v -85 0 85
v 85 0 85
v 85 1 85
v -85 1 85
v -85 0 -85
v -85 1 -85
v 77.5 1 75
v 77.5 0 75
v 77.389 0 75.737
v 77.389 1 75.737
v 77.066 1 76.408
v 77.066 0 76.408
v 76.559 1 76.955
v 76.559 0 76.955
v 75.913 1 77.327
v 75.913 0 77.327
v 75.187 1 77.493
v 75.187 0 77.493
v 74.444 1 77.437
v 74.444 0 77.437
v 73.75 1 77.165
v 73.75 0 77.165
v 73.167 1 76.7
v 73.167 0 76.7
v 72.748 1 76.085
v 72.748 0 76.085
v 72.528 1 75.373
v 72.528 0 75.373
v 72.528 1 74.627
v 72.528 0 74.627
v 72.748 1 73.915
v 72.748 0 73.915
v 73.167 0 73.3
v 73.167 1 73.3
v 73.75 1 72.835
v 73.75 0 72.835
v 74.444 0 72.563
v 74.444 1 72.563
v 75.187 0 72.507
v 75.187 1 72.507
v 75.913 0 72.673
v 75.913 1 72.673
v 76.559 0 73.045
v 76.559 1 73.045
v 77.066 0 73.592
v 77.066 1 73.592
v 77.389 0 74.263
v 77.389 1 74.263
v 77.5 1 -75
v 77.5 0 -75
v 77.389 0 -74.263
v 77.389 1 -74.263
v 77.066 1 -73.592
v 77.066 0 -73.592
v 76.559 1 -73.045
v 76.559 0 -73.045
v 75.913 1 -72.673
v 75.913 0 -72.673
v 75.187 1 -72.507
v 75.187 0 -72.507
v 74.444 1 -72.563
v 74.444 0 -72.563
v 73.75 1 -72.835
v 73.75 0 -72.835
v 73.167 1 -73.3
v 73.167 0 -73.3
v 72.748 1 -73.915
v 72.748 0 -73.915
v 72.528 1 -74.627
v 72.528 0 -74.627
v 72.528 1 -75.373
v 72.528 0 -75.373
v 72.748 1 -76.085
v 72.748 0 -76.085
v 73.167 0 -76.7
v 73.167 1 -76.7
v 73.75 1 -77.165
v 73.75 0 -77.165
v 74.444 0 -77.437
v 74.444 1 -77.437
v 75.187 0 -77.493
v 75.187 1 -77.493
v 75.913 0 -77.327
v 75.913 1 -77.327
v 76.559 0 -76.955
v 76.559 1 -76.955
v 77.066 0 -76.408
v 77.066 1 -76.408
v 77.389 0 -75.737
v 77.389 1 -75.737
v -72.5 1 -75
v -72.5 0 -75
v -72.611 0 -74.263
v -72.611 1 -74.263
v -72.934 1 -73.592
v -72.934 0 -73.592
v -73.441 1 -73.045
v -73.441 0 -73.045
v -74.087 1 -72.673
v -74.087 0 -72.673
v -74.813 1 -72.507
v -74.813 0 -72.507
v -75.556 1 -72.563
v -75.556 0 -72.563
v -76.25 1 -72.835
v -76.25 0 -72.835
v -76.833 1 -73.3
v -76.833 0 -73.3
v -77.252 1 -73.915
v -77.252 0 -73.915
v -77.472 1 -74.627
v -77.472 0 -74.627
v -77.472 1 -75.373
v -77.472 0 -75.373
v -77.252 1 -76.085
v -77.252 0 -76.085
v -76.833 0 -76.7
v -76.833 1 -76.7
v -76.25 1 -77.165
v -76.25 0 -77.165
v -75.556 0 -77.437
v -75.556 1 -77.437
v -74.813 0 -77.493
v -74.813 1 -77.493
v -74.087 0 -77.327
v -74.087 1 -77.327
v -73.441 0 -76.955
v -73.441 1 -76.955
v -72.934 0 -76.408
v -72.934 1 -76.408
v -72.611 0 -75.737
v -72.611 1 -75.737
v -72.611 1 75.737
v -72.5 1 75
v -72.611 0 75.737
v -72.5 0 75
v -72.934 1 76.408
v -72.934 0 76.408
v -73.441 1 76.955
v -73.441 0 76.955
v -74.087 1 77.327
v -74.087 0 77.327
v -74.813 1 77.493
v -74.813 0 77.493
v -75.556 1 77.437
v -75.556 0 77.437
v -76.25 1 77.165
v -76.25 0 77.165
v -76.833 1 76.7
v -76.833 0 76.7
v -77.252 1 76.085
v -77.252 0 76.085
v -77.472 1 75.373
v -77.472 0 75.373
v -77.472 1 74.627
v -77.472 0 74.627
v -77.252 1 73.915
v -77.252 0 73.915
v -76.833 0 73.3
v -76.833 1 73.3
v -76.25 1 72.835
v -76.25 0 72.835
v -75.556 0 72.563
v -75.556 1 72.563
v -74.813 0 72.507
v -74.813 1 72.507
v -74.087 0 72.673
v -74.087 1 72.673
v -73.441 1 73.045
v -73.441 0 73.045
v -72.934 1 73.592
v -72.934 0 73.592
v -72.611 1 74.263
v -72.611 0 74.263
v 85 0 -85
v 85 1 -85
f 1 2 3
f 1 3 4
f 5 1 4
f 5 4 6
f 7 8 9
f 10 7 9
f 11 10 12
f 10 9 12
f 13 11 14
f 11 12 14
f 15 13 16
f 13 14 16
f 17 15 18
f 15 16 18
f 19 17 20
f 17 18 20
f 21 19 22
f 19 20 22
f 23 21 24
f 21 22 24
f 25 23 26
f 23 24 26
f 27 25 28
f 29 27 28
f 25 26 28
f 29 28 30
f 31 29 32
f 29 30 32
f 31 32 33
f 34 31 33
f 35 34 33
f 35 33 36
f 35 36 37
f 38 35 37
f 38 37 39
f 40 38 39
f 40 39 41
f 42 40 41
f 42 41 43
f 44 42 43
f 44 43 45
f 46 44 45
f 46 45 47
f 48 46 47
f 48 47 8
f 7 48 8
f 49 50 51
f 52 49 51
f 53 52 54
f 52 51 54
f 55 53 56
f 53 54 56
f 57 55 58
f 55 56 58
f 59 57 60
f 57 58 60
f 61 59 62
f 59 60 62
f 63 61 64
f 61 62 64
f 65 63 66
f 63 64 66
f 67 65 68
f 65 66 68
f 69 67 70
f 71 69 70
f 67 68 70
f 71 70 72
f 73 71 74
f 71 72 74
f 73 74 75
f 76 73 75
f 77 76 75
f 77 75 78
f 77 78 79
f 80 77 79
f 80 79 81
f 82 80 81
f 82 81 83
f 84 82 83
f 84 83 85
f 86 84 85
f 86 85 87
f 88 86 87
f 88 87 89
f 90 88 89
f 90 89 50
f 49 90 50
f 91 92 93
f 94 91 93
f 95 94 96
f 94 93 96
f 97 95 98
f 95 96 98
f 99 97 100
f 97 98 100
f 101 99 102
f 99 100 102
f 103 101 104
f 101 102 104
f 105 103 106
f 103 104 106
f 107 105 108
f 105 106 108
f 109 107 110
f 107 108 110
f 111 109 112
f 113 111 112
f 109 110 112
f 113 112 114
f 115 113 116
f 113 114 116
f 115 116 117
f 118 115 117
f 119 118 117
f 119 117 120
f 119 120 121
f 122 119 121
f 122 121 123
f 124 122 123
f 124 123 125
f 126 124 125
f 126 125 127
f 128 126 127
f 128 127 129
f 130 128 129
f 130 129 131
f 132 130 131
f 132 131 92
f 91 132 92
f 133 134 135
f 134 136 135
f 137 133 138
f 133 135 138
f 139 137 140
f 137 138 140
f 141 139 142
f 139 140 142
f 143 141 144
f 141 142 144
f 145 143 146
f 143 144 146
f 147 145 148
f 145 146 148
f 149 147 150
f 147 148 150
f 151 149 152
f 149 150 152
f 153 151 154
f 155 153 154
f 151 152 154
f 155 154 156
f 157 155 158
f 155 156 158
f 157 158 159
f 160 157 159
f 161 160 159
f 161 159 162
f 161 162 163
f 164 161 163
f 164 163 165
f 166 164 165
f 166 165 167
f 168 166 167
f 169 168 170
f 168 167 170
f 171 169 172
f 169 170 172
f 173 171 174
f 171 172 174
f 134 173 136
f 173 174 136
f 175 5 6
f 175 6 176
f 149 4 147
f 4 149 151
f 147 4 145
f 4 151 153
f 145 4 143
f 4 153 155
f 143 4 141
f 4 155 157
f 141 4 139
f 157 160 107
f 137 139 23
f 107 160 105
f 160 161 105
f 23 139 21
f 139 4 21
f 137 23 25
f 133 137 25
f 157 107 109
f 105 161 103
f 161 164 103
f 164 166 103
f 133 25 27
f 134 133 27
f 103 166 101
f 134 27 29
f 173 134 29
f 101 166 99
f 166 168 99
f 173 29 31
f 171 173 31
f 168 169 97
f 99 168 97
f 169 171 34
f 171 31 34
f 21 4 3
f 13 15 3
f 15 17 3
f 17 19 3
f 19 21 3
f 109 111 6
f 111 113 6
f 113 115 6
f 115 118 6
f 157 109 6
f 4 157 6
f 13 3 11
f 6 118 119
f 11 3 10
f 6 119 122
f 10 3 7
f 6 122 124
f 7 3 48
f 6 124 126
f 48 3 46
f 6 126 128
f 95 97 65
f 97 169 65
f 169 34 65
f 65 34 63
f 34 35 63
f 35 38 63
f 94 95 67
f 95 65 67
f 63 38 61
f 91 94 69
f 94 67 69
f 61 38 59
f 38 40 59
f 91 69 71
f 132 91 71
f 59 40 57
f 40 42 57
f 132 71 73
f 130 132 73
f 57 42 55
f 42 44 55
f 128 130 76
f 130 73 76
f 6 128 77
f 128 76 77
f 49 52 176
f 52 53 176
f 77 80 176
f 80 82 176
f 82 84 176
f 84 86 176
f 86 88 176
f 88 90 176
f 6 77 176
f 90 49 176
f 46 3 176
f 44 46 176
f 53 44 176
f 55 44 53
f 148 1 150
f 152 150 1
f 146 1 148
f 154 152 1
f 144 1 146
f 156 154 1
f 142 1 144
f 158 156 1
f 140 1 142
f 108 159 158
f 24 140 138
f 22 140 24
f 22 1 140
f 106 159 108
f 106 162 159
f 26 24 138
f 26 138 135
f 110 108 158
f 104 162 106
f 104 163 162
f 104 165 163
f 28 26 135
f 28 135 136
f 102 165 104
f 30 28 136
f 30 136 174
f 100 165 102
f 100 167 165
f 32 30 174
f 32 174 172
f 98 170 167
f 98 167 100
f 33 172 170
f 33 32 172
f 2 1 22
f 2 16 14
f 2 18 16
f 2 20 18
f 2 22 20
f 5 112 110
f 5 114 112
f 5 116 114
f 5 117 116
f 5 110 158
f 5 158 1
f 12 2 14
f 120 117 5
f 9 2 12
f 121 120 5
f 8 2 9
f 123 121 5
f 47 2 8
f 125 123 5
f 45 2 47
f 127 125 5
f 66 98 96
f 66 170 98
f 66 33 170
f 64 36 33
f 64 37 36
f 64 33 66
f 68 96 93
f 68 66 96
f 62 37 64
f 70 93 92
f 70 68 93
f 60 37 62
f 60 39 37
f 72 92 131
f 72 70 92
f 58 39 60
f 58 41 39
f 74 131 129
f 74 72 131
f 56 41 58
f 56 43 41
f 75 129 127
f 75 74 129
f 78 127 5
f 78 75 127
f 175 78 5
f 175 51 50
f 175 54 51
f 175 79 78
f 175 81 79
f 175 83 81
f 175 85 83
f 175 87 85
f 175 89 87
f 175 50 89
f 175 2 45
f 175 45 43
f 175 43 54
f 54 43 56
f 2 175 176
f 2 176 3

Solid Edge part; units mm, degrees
sketch "Sketch1" plane through (0, 0, 0) normal (0, -1, 0) x (1, 0, 0)
  line L0 (85, 85) -> (-85, 85)
  line L1 (-85, 85) -> (-85, -85)
  line L2 (-85, -85) -> (85, -85)
  line L3 (85, -85) -> (85, 85)
extrude "Protrusion1" add sketch "Sketch1" against normal blind 1
sketch "Sketch2" plane through (0, 0, 0) normal (0, -1, 0) x (1, 0, 0)
  circle A0 centre (-75, 75) radius 2.5
  circle A1 centre (75, 75) radius 2.5
  circle A2 centre (75, -75) radius 2.5
  circle A3 centre (-75, -75) radius 2.5
  dimension "D1" = 170
  dimension "D2" = 170
extrude "Cutout1" cut sketch "Sketch2" against normal through all
properties material "Aluminum, 1060"
